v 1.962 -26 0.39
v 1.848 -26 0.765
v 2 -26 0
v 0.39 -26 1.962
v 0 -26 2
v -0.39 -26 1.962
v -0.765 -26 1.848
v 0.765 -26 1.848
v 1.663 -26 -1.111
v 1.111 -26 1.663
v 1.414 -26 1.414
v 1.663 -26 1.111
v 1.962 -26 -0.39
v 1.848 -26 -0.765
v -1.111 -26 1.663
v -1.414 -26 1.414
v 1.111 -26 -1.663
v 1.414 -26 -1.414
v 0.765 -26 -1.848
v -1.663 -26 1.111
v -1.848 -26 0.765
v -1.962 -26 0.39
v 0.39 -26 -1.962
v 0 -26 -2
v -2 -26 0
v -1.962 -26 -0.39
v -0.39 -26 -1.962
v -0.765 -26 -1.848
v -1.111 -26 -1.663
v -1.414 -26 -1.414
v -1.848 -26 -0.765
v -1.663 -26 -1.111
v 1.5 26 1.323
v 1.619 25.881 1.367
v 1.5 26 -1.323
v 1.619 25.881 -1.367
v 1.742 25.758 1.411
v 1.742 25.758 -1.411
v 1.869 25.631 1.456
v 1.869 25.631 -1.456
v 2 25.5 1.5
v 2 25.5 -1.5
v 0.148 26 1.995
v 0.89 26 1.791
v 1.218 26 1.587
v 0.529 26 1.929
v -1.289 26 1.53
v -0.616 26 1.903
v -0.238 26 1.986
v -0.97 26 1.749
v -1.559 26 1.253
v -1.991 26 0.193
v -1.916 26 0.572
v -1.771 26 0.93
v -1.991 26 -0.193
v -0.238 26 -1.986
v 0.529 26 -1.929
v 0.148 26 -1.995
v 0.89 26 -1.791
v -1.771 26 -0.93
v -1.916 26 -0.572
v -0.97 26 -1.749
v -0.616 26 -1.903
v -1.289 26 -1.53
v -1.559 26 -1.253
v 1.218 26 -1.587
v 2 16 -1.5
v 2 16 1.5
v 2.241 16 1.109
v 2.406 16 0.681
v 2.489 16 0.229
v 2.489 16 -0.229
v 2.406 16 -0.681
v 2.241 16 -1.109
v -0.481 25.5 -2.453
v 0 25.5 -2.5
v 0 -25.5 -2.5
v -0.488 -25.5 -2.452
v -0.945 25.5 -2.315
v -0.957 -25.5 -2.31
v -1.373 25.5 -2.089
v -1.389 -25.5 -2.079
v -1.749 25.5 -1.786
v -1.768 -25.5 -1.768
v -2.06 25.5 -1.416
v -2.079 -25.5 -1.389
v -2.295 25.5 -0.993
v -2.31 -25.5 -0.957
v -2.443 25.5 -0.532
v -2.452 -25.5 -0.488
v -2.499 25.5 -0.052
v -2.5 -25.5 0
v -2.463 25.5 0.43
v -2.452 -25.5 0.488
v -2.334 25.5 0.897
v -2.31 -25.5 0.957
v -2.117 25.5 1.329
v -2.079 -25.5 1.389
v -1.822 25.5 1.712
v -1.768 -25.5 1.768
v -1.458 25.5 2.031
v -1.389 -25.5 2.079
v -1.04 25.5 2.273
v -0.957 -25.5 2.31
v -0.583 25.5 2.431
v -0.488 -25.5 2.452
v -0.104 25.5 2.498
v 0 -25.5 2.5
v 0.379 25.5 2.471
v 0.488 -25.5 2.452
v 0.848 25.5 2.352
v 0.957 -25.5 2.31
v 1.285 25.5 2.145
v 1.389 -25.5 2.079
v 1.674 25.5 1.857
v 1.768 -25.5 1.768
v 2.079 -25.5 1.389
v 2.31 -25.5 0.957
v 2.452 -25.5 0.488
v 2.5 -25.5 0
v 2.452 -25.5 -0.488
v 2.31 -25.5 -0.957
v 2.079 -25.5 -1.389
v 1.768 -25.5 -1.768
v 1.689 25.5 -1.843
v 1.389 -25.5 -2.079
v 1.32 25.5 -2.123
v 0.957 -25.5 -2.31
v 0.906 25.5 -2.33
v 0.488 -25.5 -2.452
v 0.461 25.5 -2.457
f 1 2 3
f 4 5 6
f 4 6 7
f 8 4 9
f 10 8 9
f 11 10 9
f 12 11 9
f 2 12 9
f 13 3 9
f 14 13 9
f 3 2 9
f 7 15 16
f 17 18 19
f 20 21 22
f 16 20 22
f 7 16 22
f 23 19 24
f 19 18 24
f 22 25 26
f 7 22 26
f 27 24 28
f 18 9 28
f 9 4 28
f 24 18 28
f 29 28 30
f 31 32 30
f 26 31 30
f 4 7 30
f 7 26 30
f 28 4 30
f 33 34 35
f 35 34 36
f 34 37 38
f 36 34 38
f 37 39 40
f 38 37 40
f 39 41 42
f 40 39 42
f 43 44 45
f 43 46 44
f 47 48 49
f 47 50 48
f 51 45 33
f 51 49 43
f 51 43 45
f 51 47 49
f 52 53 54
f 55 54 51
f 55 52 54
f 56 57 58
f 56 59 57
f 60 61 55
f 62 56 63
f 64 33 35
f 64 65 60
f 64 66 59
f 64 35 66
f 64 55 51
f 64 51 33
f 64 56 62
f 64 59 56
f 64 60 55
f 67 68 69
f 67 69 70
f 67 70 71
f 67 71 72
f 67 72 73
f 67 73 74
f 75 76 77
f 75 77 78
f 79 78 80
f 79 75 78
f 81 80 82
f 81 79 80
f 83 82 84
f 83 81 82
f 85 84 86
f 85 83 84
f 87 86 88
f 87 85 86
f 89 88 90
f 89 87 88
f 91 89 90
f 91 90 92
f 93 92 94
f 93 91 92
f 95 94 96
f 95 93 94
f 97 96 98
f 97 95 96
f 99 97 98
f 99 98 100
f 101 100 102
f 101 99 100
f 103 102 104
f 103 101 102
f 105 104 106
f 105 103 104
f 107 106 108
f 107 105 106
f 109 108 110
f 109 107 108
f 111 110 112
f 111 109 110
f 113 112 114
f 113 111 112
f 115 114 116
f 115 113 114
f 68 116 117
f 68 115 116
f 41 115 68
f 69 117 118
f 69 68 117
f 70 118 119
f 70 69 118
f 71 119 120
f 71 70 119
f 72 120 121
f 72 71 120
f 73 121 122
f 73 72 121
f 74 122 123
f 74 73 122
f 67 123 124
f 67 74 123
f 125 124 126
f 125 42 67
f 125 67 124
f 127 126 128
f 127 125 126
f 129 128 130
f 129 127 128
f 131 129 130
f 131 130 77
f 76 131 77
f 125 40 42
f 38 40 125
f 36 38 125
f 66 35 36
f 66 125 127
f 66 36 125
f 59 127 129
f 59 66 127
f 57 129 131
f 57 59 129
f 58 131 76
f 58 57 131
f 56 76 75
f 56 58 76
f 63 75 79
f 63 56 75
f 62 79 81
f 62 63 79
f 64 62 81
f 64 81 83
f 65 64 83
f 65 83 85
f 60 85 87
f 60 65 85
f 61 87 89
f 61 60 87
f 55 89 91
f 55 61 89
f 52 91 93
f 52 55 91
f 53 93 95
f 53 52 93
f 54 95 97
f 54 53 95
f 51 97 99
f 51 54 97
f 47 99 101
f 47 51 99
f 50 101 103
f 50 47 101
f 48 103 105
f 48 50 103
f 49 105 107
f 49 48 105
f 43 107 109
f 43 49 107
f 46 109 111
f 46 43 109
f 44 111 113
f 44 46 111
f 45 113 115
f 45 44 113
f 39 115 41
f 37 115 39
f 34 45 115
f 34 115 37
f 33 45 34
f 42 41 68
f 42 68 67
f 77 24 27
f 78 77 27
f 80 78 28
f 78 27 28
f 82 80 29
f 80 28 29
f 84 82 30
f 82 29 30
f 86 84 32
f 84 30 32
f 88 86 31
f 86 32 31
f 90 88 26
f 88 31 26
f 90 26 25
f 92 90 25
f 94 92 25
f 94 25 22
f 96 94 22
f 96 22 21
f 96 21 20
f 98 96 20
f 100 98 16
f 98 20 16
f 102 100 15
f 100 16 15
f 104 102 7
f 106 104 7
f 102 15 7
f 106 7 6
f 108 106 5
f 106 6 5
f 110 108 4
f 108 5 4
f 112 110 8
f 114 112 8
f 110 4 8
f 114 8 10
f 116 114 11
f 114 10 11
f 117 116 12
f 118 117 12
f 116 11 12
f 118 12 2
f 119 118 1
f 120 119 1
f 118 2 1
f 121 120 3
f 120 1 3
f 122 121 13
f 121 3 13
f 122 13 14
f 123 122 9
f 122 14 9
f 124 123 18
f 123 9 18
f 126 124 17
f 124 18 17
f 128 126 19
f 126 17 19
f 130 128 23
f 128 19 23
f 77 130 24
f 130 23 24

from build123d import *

# Parameters (mm, degrees)
SKETCH1_R           = 2.5
BOSS_EXTRUDE1_DEPTH = 26
CUT_EXTRUDE1_START  = 2
SKETCH2_W           = 13.97289477
SKETCH2_H           = 14.193433712
CUT_EXTRUDE1_DEPTH  = 52
CHAMFER1_SIZE       = 0.5


with BuildPart() as part:
    # Sketch1 → Boss-Extrude1 (new, symmetric)
    with BuildSketch(Plane(origin=(0, 0, 0), x_dir=(1, 0, 0), z_dir=(0, 1, 0))):
        with Locations(Location((0, 0, 0), (0, 0, 90))):
            Circle(SKETCH1_R)
    extrude(amount=BOSS_EXTRUDE1_DEPTH, both=True)

    # Sketch2 → Cut-Extrude1 (cut)
    with BuildSketch(Plane(origin=(0, 0, 0), x_dir=(0, 0, -1), z_dir=(1, 0, 0)).offset(CUT_EXTRUDE1_START)):
        with Locations((0, 23.096716856)):
            Rectangle(SKETCH2_W, SKETCH2_H)
    extrude(amount=CUT_EXTRUDE1_DEPTH, mode=Mode.SUBTRACT)

    # Chamfer1
    chamfer1_edges = [part.edges().sort_by_distance(p)[0] for p in [
        (0, -26, 2.5),
        (-2.236067977, 26, 1.118033989),
        (2, 26, 0),
    ]]
    chamfer(chamfer1_edges, length=CHAMFER1_SIZE - 0.0001)  # a hair under: the kernel refuses the full size


solid = part.part
